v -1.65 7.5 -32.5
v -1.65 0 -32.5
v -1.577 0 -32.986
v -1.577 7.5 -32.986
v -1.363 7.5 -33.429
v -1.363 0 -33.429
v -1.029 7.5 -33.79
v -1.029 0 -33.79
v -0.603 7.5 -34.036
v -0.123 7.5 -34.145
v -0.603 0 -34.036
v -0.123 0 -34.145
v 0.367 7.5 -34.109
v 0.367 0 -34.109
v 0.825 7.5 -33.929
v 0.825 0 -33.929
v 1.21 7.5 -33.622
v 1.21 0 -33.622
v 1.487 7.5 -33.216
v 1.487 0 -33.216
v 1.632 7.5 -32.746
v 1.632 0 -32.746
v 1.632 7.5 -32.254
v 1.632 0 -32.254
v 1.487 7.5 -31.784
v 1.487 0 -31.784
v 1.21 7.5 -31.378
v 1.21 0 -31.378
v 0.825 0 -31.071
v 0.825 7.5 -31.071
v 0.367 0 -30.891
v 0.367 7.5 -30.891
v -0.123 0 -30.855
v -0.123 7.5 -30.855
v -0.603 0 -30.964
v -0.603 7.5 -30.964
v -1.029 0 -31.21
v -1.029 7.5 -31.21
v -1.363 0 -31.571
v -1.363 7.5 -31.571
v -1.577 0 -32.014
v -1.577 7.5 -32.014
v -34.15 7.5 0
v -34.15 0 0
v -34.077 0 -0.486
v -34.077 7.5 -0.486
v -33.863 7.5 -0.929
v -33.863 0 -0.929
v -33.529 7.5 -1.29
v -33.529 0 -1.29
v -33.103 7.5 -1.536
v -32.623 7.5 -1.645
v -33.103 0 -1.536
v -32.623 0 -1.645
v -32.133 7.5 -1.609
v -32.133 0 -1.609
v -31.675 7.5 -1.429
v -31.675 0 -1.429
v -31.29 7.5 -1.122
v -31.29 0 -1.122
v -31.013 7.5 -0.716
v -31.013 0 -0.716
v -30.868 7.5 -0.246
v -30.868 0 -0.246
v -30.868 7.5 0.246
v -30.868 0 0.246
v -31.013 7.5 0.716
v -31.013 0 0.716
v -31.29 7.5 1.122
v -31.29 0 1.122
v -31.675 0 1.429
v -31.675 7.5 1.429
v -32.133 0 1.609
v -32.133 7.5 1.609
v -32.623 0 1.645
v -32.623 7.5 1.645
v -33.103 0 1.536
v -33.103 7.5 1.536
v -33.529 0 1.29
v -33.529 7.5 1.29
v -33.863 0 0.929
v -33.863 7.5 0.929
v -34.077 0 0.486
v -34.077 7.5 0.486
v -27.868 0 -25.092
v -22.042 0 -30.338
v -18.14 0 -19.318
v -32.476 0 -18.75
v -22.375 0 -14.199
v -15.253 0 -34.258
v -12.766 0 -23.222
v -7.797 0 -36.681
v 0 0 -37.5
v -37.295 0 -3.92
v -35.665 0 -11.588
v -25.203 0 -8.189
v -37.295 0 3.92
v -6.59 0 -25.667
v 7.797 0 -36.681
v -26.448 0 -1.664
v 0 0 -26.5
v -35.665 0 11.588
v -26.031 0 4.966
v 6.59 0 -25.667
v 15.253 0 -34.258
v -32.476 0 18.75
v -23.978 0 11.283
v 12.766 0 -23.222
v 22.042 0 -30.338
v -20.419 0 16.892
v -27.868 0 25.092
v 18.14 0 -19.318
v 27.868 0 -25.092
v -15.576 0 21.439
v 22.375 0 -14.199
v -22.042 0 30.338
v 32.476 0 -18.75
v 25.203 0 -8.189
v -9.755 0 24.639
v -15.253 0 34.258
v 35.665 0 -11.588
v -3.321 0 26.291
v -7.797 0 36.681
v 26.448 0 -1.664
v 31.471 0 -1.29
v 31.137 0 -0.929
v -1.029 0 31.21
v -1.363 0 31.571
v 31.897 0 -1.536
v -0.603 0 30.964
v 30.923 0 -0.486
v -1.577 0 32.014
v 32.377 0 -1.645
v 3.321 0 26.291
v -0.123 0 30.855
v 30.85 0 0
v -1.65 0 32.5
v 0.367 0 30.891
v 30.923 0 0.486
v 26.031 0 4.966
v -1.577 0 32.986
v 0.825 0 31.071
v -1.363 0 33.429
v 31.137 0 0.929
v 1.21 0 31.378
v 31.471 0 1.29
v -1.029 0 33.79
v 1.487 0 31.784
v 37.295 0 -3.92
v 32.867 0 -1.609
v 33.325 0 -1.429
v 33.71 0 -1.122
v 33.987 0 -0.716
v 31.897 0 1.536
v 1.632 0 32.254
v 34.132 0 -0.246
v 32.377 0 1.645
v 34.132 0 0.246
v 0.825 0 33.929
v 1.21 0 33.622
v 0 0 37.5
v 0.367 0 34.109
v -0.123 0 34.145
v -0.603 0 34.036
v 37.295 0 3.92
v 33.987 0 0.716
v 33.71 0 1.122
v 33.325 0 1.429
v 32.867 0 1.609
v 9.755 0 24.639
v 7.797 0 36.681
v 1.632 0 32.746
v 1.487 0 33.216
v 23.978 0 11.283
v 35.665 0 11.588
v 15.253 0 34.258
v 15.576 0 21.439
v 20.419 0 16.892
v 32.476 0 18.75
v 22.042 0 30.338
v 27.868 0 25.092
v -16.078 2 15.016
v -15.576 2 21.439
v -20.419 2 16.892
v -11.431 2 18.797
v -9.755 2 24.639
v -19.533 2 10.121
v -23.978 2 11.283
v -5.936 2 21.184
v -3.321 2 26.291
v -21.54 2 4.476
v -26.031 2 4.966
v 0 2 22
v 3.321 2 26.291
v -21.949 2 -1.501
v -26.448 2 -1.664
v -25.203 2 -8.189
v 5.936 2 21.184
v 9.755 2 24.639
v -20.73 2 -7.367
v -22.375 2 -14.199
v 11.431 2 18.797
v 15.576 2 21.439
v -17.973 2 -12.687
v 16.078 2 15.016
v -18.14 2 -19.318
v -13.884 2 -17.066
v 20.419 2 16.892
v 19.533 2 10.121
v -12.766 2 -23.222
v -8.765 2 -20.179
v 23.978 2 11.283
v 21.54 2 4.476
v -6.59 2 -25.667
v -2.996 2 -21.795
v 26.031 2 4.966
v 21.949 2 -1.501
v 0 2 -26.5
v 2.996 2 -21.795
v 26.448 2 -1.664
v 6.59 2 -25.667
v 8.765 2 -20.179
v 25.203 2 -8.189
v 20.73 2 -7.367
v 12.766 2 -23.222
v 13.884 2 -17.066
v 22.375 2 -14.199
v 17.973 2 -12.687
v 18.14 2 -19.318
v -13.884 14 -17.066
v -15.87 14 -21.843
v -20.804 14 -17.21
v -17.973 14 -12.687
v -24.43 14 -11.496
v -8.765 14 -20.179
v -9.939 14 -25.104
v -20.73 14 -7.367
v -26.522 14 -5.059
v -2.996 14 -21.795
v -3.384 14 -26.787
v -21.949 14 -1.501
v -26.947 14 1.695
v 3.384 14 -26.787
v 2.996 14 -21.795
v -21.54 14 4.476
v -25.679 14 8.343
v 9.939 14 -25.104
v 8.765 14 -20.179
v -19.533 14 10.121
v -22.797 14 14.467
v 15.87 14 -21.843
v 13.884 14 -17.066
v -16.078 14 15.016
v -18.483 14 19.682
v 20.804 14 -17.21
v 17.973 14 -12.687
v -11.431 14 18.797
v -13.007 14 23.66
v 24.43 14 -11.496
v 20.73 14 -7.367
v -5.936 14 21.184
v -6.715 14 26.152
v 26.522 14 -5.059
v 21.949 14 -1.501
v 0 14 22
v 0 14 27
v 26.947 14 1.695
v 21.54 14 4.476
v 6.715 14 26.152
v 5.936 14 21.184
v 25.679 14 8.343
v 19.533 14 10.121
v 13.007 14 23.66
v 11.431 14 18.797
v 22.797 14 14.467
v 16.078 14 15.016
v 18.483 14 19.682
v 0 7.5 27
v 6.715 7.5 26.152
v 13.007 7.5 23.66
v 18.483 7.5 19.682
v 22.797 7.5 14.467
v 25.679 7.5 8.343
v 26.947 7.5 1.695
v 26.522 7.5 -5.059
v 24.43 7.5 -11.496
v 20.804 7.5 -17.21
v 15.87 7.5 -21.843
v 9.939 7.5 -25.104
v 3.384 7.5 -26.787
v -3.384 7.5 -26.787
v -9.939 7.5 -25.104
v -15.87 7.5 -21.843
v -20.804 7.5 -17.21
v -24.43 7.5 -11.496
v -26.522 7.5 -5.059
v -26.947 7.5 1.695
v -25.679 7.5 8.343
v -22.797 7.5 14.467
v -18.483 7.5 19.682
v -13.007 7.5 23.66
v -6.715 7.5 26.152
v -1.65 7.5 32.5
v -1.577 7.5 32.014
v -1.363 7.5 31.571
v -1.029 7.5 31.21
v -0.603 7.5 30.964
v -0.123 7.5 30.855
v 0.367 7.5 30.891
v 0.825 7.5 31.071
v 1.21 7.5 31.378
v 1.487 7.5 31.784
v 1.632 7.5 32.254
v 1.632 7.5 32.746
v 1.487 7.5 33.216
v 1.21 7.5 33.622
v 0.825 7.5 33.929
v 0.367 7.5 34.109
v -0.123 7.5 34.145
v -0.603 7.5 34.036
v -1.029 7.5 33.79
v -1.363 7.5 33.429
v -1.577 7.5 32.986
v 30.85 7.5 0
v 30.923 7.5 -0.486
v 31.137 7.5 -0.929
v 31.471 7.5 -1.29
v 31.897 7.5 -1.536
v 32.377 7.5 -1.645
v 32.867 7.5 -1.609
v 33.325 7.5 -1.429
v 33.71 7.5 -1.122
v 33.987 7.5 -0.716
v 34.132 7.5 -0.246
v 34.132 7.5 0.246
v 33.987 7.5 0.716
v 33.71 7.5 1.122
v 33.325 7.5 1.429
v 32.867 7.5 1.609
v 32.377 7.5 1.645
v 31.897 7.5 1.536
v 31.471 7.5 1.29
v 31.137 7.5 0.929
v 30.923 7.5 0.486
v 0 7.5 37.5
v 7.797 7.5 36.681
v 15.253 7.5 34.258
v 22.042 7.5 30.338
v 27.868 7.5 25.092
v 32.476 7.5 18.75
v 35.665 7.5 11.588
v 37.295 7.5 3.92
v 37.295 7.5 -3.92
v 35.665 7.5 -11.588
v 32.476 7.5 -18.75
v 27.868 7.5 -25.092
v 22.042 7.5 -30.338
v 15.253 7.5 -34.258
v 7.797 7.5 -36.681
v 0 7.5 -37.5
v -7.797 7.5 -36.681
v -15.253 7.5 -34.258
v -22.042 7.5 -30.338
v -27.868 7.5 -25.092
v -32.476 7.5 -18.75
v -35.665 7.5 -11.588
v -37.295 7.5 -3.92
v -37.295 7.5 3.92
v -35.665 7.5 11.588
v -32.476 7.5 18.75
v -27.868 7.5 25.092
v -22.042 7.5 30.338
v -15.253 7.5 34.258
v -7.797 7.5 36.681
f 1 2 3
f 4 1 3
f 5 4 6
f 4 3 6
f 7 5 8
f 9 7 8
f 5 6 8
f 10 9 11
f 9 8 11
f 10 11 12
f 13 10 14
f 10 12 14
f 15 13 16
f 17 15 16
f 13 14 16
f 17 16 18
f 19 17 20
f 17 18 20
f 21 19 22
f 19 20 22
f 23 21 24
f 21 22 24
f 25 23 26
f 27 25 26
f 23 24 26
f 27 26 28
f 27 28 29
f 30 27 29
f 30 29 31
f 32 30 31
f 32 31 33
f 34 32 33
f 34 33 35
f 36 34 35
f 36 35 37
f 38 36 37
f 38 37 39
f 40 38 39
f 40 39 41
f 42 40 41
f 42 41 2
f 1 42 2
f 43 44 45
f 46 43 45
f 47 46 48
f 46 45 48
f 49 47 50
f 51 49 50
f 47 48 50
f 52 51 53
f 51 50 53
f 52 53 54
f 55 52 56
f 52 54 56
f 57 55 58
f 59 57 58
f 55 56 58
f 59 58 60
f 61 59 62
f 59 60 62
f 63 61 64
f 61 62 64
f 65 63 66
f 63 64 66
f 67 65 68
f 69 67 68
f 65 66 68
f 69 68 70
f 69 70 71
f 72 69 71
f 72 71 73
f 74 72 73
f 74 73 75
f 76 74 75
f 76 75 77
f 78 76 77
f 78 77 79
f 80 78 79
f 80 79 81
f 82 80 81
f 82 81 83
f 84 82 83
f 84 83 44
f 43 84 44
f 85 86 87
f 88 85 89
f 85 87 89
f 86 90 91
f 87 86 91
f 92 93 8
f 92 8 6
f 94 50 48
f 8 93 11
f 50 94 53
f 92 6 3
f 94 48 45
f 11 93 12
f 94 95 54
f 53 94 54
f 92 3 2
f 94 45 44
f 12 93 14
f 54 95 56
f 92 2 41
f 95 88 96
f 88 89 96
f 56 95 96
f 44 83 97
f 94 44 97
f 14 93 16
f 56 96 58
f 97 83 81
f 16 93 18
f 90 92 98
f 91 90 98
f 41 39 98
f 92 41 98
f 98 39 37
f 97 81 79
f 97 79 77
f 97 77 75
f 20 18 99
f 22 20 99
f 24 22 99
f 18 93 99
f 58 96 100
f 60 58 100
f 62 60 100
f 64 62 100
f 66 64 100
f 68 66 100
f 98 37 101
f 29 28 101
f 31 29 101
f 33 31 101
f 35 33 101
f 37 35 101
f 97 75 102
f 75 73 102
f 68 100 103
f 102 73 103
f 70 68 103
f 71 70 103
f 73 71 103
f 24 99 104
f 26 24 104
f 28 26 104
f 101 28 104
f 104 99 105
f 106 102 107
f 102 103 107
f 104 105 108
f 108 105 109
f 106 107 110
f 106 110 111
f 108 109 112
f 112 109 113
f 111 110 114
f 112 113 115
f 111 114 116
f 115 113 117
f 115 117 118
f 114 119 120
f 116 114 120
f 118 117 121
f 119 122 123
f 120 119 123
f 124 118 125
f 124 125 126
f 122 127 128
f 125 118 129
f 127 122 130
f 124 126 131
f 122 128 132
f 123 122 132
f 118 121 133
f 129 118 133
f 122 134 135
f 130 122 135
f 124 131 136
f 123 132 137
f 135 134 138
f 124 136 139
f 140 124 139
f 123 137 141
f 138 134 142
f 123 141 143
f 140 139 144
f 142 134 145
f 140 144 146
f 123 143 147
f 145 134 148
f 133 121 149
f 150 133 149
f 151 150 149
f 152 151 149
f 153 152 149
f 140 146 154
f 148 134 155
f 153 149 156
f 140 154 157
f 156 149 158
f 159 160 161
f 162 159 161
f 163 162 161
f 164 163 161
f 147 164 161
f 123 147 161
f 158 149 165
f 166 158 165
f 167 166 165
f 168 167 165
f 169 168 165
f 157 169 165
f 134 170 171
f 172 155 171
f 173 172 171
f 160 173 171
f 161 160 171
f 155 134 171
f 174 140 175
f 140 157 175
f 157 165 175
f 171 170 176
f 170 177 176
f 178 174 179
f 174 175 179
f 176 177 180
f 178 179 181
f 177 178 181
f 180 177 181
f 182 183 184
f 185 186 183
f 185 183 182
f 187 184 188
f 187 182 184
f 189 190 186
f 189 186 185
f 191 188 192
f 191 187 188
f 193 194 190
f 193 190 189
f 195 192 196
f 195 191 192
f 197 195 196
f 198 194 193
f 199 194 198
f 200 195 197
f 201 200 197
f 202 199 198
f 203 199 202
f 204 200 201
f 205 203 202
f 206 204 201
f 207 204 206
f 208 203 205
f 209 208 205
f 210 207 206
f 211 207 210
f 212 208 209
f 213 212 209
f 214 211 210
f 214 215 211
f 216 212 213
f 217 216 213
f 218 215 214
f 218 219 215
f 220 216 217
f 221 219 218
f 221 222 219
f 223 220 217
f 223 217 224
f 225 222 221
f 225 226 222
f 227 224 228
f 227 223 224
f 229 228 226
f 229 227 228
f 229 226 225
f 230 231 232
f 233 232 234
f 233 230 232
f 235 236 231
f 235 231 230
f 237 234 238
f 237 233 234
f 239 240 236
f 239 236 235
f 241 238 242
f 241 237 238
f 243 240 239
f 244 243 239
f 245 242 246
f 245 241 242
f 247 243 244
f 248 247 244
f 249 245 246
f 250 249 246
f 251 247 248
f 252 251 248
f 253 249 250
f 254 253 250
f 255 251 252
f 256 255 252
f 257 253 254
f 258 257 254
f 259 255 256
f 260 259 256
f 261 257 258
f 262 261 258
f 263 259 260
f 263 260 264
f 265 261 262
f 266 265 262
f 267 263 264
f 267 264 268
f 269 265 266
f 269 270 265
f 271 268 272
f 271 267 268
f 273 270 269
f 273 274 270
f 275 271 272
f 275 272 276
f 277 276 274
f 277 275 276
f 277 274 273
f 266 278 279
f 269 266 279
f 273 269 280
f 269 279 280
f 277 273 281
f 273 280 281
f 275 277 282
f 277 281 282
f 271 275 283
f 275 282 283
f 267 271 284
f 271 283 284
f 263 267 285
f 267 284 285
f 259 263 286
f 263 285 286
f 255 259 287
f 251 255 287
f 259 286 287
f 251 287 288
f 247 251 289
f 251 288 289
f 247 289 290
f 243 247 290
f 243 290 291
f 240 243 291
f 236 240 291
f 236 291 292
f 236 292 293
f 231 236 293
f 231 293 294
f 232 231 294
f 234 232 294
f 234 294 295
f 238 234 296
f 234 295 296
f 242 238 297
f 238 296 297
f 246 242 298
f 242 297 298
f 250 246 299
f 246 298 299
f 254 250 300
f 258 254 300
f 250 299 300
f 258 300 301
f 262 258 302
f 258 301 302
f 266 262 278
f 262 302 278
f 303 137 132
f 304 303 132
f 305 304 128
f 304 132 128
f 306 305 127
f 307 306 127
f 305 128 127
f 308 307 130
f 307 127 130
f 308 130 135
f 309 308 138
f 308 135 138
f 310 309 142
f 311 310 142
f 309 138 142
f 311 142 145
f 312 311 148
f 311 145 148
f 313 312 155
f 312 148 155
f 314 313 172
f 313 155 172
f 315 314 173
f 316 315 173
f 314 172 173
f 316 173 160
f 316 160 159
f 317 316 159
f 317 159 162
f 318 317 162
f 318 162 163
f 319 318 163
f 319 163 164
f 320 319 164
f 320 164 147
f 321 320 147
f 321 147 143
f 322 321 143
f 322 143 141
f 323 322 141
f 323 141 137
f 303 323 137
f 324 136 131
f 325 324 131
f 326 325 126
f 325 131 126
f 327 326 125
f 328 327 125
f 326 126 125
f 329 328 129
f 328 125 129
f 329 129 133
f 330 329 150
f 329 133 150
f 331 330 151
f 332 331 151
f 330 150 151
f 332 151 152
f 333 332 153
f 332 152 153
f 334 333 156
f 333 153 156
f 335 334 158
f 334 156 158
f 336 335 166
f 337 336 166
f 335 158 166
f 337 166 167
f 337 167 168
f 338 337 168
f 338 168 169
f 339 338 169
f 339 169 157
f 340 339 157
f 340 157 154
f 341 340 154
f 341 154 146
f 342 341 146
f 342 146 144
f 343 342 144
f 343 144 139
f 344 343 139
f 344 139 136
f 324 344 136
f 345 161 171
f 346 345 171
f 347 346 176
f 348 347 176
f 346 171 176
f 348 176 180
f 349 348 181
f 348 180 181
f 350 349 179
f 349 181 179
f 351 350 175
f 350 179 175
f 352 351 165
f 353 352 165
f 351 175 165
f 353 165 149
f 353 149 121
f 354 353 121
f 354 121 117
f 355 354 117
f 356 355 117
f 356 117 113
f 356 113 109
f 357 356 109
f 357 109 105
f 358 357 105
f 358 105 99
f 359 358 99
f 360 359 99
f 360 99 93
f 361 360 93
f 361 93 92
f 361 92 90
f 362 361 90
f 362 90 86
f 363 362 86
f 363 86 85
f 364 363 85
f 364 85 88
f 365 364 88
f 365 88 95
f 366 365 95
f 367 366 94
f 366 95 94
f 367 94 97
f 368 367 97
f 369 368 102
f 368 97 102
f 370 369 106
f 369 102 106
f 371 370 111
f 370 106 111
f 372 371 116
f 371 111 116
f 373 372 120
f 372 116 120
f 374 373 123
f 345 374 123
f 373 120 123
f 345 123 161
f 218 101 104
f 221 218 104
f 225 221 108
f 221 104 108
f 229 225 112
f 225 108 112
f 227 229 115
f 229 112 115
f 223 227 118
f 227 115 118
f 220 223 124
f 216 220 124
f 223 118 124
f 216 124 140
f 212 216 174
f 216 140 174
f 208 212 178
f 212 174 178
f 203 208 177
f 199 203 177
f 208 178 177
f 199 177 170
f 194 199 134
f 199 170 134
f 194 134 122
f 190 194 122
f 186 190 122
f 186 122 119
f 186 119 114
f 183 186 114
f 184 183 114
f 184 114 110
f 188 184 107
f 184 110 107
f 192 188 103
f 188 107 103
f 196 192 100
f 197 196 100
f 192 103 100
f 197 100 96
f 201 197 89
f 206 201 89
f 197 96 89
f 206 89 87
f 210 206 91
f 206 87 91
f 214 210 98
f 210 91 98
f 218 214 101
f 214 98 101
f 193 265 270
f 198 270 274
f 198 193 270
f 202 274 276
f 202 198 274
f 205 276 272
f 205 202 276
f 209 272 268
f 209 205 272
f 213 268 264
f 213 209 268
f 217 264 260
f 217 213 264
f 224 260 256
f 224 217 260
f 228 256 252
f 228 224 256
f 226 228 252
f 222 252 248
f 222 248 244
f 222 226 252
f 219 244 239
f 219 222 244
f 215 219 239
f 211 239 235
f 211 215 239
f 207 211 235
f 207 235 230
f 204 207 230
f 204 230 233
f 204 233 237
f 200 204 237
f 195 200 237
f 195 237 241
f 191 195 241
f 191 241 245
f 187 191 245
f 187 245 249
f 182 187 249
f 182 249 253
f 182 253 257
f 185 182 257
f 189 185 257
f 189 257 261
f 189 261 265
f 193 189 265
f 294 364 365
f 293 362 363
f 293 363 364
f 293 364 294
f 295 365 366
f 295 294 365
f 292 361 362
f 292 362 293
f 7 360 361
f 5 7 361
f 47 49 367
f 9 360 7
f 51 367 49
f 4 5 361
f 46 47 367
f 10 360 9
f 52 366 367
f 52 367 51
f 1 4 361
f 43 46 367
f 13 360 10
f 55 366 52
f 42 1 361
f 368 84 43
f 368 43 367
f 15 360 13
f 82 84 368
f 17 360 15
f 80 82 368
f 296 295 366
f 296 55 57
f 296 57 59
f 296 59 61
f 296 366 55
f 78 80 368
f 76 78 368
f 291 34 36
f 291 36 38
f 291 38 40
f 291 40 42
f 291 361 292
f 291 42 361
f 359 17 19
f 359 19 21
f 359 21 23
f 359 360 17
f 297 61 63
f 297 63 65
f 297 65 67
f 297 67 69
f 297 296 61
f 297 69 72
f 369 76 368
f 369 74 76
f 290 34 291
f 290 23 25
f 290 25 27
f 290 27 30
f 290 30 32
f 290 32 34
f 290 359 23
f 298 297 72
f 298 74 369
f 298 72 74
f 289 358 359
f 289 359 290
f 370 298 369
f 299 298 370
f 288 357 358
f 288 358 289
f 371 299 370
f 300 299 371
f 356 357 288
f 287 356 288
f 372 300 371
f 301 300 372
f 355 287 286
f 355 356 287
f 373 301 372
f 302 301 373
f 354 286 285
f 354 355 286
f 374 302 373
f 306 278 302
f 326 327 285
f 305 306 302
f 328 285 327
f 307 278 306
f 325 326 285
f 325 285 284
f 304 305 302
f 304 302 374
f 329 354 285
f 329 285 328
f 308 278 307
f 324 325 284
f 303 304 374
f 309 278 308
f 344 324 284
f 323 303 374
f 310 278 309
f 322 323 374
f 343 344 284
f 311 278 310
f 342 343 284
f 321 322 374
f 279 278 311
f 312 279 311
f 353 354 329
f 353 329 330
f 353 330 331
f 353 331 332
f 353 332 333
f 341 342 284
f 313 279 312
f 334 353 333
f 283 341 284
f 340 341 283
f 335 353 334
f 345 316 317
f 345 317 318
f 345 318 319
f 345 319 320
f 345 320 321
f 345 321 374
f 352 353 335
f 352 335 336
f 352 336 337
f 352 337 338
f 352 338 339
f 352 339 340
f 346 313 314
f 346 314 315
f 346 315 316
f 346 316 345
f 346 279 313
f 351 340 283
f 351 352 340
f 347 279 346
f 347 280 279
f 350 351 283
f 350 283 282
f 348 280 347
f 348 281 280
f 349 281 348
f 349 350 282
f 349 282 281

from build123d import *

# Parameters (mm, degrees)
SKIZZE1_R                       = 37.5
SKIZZE1_R_2                     = 22
AUFSATZ_LINEAR_AUSTRAGEN1_DEPTH = 14
SCHNITT_LINEAR_START            = -6.5
SKIZZE2_R                       = 37.5
SKIZZE2_R_2                     = 27
SCHNITT_LINEAR_AUSTRAGEN1_DEPTH = 6.5
M4X0_7_GEWINDEBOHRUNG1_D        = 3.3
SKIZZE5_R                       = 26.5
SCHNITT_LINEAR_AUSTRAGEN2_DEPTH = 2


with BuildPart() as part:
    # Skizze1 → Aufsatz-Linear austragen1 (new body)
    with BuildSketch(Plane(origin=(0, 0, 0), x_dir=(1, 0, 0), z_dir=(0, 1, 0))):
        with Locations(Location((0, 0, 0), (0, 0, 270))):
            Circle(SKIZZE1_R)
        with Locations(Location((0, 0, 0), (0, 0, 270))):
            Circle(SKIZZE1_R_2, mode=Mode.SUBTRACT)
    extrude(amount=AUFSATZ_LINEAR_AUSTRAGEN1_DEPTH)

    # Skizze2 → Schnitt-Linear austragen1 (cut)
    with BuildSketch(Plane(origin=(0, 14, 0), x_dir=(1, 0, 0), z_dir=(0, 1, 0)).offset(SCHNITT_LINEAR_START)):
        with Locations(Location((0, 0, 0), (0, 0, 270))):
            Circle(SKIZZE2_R)
        with Locations(Location((0, 0, 0), (0, 0, 270))):
            Circle(SKIZZE2_R_2, mode=Mode.SUBTRACT)
    extrude(amount=SCHNITT_LINEAR_AUSTRAGEN1_DEPTH, mode=Mode.SUBTRACT)

    # M4x0.7 Gewindebohrung1 (through all)
    with Locations(Plane(origin=(0, 7.5, 0), x_dir=(1, 0, 0), z_dir=(0, 1, 0))):
        with Locations((-32.5, 0), (0, 32.5), (0, -32.5), (32.5, 0)):
            Hole(M4X0_7_GEWINDEBOHRUNG1_D / 2)

    # Skizze5 → Schnitt-Linear austragen2 (cut)
    with BuildSketch(Plane.XZ):
        with Locations(Location((0, 0, 0), (0, 0, 270))):
            Circle(SKIZZE5_R)
    extrude(amount=-SCHNITT_LINEAR_AUSTRAGEN2_DEPTH, mode=Mode.SUBTRACT)


solid = part.part
